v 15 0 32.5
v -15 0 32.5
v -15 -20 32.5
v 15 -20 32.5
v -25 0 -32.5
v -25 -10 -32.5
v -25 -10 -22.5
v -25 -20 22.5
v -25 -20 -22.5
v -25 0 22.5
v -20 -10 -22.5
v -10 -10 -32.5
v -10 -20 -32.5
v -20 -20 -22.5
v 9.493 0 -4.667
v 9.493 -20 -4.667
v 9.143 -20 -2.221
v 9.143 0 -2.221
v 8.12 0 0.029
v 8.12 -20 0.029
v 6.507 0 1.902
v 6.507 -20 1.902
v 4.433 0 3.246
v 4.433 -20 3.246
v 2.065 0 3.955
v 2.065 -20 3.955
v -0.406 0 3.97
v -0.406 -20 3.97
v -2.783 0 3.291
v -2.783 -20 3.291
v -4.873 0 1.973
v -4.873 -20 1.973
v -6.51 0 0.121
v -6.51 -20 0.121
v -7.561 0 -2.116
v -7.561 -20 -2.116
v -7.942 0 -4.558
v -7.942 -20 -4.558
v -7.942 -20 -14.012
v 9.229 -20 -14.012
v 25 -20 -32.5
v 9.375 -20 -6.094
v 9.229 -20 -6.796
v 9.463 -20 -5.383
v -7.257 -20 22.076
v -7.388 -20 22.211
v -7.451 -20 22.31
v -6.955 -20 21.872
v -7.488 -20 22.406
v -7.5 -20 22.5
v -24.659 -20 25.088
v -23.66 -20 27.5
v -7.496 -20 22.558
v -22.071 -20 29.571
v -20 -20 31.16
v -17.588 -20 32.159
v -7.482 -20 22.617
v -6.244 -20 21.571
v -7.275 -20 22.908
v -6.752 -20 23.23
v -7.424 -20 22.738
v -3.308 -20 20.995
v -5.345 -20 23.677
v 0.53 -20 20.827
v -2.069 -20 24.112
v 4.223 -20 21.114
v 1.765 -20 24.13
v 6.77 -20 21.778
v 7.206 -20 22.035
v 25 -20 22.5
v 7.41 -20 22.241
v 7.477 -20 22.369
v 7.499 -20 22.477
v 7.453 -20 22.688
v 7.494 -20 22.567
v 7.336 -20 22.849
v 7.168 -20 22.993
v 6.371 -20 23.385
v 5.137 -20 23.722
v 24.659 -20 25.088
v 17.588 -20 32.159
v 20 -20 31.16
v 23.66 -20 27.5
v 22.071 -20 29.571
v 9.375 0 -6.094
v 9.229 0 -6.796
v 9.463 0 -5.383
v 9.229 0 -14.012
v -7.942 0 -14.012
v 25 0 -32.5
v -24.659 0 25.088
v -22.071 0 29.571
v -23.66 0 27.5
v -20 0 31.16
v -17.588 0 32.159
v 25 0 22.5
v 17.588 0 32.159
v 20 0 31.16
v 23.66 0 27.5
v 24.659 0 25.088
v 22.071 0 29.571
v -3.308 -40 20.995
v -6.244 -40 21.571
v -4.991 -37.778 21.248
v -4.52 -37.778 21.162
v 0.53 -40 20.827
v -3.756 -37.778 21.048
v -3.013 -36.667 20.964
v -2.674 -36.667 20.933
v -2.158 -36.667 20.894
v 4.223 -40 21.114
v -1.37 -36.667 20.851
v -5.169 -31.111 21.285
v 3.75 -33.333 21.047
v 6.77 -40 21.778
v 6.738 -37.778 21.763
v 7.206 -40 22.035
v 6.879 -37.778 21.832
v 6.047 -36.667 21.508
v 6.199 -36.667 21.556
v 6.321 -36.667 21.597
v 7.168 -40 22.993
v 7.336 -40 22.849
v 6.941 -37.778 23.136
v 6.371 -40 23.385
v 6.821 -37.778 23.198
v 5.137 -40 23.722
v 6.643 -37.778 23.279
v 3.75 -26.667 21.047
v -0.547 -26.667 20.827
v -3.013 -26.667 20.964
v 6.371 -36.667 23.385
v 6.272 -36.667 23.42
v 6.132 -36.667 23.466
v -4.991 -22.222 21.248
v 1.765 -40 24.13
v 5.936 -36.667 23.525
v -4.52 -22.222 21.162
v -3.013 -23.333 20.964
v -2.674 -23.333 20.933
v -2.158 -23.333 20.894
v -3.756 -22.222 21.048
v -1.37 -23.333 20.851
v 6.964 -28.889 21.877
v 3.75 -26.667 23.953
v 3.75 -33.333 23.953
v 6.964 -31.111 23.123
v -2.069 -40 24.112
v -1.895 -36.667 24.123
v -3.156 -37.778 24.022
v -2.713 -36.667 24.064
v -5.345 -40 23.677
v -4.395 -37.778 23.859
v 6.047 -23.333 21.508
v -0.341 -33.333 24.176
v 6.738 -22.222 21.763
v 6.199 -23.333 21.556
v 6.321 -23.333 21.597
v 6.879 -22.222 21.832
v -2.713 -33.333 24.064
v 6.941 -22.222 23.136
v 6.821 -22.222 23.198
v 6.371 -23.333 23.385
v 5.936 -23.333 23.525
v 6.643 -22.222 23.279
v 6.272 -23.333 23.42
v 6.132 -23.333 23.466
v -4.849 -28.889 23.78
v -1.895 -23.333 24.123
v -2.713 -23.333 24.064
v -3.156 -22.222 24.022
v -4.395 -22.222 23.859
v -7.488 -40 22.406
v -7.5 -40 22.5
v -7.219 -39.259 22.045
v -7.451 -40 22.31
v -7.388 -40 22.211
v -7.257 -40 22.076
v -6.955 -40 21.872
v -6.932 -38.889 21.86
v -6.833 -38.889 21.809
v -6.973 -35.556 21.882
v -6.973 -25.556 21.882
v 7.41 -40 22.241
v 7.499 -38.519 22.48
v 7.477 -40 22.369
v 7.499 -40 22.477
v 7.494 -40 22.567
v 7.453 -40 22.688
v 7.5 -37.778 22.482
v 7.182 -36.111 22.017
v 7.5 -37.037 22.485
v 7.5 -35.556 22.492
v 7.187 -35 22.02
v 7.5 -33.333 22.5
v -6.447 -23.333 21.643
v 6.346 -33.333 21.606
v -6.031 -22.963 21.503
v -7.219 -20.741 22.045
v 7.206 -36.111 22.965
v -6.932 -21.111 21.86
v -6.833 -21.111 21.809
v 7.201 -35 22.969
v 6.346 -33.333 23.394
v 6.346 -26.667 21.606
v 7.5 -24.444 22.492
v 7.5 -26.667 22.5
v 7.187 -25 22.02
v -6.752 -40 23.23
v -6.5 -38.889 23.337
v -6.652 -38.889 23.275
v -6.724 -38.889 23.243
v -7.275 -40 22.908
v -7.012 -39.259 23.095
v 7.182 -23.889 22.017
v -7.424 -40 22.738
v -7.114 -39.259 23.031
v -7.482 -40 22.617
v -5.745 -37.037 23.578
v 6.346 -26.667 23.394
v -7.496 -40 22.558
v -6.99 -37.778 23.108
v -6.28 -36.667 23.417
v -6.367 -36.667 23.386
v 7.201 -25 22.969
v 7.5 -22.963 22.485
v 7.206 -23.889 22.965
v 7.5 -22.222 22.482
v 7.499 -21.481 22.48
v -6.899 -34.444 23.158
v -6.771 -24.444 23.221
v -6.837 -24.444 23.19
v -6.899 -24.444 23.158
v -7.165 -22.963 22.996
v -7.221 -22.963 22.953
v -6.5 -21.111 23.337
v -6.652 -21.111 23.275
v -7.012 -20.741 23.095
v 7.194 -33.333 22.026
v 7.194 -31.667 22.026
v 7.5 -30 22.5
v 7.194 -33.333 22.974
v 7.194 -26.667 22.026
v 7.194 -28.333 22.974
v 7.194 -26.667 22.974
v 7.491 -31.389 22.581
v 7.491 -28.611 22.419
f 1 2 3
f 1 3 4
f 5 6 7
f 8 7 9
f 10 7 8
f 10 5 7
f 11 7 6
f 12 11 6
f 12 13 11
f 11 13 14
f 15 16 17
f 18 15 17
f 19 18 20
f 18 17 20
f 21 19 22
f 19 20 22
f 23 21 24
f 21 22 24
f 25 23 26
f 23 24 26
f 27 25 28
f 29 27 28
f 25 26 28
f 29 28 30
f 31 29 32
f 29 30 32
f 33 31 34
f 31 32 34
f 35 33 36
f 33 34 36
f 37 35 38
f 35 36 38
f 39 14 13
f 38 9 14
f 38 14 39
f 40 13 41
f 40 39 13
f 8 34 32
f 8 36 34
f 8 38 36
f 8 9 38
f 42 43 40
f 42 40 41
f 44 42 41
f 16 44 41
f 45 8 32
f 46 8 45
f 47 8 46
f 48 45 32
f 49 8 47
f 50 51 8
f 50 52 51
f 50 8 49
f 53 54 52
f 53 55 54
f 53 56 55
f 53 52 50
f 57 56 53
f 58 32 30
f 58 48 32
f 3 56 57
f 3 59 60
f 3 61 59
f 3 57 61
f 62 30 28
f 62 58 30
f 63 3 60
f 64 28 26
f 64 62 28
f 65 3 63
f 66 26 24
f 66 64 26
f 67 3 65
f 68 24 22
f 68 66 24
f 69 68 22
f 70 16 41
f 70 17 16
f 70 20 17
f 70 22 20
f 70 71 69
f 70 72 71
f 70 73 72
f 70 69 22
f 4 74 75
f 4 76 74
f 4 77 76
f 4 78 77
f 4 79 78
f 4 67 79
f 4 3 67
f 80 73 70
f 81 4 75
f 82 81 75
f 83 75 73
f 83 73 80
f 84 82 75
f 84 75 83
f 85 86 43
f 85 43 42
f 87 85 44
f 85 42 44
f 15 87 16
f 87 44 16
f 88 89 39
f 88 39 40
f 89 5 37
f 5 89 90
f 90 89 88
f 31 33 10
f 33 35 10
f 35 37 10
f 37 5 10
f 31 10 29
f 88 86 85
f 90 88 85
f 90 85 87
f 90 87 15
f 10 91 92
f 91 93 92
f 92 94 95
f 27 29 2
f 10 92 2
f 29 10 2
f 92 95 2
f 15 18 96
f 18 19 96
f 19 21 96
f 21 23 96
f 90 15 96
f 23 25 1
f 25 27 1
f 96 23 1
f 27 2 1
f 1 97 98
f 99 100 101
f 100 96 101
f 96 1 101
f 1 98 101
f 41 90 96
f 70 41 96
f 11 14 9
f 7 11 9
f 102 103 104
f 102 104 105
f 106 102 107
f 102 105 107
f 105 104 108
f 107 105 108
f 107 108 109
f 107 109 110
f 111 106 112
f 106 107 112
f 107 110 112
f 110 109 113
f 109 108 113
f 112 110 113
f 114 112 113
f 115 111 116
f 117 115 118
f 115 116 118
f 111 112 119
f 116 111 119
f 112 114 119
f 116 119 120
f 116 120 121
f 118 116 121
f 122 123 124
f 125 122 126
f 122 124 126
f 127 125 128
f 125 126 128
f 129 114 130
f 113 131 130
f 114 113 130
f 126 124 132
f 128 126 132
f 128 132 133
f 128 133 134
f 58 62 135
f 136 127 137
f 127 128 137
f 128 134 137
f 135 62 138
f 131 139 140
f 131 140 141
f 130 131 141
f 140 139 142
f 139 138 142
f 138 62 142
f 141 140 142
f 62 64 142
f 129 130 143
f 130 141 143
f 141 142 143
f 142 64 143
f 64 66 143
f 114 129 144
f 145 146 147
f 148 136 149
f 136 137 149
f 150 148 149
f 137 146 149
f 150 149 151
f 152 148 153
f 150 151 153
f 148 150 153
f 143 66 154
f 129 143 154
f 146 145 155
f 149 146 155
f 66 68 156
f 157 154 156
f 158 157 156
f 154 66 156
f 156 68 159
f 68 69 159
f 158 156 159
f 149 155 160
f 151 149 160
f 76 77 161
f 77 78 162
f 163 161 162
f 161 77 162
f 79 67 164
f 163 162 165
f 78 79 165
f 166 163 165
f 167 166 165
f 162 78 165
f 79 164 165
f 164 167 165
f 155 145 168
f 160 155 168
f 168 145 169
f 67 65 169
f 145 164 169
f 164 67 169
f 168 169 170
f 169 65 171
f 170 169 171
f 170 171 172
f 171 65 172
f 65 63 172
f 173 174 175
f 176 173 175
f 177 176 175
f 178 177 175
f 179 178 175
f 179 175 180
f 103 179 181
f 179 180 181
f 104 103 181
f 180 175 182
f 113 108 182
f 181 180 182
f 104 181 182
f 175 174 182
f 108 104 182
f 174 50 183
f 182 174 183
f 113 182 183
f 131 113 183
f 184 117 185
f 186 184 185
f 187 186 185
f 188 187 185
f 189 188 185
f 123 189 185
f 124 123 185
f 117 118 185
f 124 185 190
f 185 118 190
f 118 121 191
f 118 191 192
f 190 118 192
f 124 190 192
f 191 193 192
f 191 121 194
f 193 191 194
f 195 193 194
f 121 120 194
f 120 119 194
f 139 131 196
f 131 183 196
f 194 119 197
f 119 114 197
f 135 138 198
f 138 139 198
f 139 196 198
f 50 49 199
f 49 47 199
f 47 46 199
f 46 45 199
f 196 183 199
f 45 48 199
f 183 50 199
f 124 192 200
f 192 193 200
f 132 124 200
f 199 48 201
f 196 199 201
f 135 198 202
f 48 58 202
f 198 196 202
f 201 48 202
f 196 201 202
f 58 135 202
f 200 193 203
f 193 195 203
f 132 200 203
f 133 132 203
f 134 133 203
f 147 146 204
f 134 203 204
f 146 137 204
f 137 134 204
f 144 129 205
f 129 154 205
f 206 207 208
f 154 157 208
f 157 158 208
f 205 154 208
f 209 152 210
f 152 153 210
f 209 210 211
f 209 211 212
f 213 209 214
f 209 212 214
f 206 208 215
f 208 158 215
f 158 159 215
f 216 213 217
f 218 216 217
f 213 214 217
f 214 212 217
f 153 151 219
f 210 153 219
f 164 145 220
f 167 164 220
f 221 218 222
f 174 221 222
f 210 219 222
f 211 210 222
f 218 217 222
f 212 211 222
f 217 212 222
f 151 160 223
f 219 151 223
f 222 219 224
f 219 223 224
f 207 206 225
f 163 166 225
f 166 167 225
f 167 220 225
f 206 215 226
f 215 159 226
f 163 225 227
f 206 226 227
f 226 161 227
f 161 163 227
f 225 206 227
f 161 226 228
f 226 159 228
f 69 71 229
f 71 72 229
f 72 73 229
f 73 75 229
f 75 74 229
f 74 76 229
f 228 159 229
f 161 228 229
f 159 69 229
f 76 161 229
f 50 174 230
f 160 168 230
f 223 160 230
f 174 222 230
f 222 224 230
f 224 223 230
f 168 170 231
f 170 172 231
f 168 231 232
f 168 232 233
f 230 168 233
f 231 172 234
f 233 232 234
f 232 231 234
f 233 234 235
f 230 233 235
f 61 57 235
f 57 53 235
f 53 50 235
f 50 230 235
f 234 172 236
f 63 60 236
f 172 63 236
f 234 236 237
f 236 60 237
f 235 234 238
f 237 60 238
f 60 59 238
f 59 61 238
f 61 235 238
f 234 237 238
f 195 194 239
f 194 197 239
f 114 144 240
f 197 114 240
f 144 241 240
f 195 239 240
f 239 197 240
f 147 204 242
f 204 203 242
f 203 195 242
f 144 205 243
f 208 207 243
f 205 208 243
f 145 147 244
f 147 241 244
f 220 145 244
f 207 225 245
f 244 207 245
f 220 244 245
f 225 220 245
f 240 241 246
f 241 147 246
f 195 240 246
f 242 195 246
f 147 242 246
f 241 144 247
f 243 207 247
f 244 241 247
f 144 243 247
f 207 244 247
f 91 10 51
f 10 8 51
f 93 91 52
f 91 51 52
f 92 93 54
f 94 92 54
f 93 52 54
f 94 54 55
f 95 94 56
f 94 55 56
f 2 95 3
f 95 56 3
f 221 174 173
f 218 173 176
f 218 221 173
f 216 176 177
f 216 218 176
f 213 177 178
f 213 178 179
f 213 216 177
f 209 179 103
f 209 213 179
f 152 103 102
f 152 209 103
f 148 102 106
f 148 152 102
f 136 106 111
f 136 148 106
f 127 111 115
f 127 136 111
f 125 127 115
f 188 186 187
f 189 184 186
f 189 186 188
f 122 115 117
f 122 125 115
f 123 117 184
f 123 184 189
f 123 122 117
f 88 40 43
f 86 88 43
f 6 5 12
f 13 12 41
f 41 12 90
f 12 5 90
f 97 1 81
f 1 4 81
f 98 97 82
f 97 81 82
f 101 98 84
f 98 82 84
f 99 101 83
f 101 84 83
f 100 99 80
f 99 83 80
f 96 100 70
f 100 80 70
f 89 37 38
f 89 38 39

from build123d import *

# Parameters (mm, degrees)
F0_W          = 50
F0_H          = 65
F1_DEPTH      = 20
F3_DEPTH      = 25.4
F3_DEPTH_BACK = 25.4
F4_R          = 10
F6_DEPTH      = 10
F8_DEPTH      = 20
F10_DEPTH     = 65.0010001


with BuildPart() as f1:
    # F0 (on Front) → F1 (new body)
    with BuildSketch(Plane.XZ):
        Rectangle(F0_W, F0_H)
    extrude(amount=F1_DEPTH)

    # F2 (on face) → F3 (cut, two sides)
    with BuildSketch(Plane.XZ.offset(20)) as f3_sk:
        with BuildLine():
            Line((-7.9418579116, -14.0116587281), (9.2289298773, -14.0116587281))
            Line((9.2289298773, -14.0116587281), (9.2289298773, -6.7959995619))
            ThreePointArc((9.2289298773, -6.7959995619), (-0.2431108887, -13.3252146406), (-7.9418579116, -4.7765597701))
            Line((-7.9418579116, -4.7765597701), (-7.9418579116, -14.0116587281))
        make_face()
        with BuildLine():
            Line((9.2289298773, -4.5578256249), (9.2289298773, -6.7959995619))
            ThreePointArc((9.2289298773, -6.7959995619), (9.4266149422, -5.7397445697), (9.4928454099, -4.6671926975))
            ThreePointArc((9.4928454099, -4.6671926975), (0.8298353341, 4.0503304752), (-7.9418579116, -4.5578256249))
            Line((-7.9418579116, -4.5578256249), (9.2289298773, -4.5578256249))
        make_face()
        with BuildLine():
            ThreePointArc((-7.9418579116, -4.7765597701), (-0.2431108887, -13.3252146406), (9.2289298773, -6.7959995619))
            Line((9.2289298773, -6.7959995619), (9.2289298773, -4.5578256249))
            Line((9.2289298773, -4.5578256249), (-7.9418579116, -4.5578256249))
            Line((-7.9418579116, -4.5578256249), (-7.9418579116, -4.7765597701))
        make_face()
    extrude(amount=F3_DEPTH, mode=Mode.SUBTRACT)
    extrude(f3_sk.sketch, amount=-F3_DEPTH_BACK, mode=Mode.SUBTRACT)

    # F4
    f4_edges = [f1.edges().sort_by_distance(p)[0] for p in [
        (25, -10, 32.5),
        (-25, -10, 32.5),
    ]]
    fillet(f4_edges, radius=F4_R)

    # F5 (on face) → F6 (cut)
    with BuildSketch(Plane.XZ.offset(20)):
        Polygon((-20, -22.5), (-25, -22.5), (-25, -32.5), (-10, -32.5), align=None)
    extrude(amount=-F6_DEPTH, mode=Mode.SUBTRACT)

    # F7 (on face) → F8 (join)
    with BuildSketch(Plane.XZ.offset(20)):
        with BuildLine():
            add(Edge.make_bspline(
                [(-7.5, 22.5), (-7.5, 19.5948551827), (3.75, 21.0474275913), (15, 22.5), (3.75, 23.9525724087), (-7.5, 25.4051448173), (-7.5, 22.5)],
                knots=[0, 0, 0, 2.0943951024, 2.0943951024, 4.1887902048, 4.1887902048, 6.2831853072, 6.2831853072, 6.2831853072], degree=2, weights=[1, 0.5, 1, 0.5, 1, 0.5, 1]))
        make_face()
    extrude(amount=F8_DEPTH)

    # F9 (on face) → F10 (cut, through all)
    with BuildSketch(Plane(origin=(0, 0, -32.5), x_dir=(1, 0, 0), z_dir=(0, 0, -1))):
        with BuildLine():
            ThreePointArc((25, 15), (28.5355339059, 16.4644660941), (30, 20))
            ThreePointArc((30, 20), (25, 25), (20, 20))
            Line((20, 20), (25, 20))
            Line((25, 20), (25, 15))
        make_face()
    extrude(amount=-F10_DEPTH, mode=Mode.SUBTRACT)


solid = f1.part
